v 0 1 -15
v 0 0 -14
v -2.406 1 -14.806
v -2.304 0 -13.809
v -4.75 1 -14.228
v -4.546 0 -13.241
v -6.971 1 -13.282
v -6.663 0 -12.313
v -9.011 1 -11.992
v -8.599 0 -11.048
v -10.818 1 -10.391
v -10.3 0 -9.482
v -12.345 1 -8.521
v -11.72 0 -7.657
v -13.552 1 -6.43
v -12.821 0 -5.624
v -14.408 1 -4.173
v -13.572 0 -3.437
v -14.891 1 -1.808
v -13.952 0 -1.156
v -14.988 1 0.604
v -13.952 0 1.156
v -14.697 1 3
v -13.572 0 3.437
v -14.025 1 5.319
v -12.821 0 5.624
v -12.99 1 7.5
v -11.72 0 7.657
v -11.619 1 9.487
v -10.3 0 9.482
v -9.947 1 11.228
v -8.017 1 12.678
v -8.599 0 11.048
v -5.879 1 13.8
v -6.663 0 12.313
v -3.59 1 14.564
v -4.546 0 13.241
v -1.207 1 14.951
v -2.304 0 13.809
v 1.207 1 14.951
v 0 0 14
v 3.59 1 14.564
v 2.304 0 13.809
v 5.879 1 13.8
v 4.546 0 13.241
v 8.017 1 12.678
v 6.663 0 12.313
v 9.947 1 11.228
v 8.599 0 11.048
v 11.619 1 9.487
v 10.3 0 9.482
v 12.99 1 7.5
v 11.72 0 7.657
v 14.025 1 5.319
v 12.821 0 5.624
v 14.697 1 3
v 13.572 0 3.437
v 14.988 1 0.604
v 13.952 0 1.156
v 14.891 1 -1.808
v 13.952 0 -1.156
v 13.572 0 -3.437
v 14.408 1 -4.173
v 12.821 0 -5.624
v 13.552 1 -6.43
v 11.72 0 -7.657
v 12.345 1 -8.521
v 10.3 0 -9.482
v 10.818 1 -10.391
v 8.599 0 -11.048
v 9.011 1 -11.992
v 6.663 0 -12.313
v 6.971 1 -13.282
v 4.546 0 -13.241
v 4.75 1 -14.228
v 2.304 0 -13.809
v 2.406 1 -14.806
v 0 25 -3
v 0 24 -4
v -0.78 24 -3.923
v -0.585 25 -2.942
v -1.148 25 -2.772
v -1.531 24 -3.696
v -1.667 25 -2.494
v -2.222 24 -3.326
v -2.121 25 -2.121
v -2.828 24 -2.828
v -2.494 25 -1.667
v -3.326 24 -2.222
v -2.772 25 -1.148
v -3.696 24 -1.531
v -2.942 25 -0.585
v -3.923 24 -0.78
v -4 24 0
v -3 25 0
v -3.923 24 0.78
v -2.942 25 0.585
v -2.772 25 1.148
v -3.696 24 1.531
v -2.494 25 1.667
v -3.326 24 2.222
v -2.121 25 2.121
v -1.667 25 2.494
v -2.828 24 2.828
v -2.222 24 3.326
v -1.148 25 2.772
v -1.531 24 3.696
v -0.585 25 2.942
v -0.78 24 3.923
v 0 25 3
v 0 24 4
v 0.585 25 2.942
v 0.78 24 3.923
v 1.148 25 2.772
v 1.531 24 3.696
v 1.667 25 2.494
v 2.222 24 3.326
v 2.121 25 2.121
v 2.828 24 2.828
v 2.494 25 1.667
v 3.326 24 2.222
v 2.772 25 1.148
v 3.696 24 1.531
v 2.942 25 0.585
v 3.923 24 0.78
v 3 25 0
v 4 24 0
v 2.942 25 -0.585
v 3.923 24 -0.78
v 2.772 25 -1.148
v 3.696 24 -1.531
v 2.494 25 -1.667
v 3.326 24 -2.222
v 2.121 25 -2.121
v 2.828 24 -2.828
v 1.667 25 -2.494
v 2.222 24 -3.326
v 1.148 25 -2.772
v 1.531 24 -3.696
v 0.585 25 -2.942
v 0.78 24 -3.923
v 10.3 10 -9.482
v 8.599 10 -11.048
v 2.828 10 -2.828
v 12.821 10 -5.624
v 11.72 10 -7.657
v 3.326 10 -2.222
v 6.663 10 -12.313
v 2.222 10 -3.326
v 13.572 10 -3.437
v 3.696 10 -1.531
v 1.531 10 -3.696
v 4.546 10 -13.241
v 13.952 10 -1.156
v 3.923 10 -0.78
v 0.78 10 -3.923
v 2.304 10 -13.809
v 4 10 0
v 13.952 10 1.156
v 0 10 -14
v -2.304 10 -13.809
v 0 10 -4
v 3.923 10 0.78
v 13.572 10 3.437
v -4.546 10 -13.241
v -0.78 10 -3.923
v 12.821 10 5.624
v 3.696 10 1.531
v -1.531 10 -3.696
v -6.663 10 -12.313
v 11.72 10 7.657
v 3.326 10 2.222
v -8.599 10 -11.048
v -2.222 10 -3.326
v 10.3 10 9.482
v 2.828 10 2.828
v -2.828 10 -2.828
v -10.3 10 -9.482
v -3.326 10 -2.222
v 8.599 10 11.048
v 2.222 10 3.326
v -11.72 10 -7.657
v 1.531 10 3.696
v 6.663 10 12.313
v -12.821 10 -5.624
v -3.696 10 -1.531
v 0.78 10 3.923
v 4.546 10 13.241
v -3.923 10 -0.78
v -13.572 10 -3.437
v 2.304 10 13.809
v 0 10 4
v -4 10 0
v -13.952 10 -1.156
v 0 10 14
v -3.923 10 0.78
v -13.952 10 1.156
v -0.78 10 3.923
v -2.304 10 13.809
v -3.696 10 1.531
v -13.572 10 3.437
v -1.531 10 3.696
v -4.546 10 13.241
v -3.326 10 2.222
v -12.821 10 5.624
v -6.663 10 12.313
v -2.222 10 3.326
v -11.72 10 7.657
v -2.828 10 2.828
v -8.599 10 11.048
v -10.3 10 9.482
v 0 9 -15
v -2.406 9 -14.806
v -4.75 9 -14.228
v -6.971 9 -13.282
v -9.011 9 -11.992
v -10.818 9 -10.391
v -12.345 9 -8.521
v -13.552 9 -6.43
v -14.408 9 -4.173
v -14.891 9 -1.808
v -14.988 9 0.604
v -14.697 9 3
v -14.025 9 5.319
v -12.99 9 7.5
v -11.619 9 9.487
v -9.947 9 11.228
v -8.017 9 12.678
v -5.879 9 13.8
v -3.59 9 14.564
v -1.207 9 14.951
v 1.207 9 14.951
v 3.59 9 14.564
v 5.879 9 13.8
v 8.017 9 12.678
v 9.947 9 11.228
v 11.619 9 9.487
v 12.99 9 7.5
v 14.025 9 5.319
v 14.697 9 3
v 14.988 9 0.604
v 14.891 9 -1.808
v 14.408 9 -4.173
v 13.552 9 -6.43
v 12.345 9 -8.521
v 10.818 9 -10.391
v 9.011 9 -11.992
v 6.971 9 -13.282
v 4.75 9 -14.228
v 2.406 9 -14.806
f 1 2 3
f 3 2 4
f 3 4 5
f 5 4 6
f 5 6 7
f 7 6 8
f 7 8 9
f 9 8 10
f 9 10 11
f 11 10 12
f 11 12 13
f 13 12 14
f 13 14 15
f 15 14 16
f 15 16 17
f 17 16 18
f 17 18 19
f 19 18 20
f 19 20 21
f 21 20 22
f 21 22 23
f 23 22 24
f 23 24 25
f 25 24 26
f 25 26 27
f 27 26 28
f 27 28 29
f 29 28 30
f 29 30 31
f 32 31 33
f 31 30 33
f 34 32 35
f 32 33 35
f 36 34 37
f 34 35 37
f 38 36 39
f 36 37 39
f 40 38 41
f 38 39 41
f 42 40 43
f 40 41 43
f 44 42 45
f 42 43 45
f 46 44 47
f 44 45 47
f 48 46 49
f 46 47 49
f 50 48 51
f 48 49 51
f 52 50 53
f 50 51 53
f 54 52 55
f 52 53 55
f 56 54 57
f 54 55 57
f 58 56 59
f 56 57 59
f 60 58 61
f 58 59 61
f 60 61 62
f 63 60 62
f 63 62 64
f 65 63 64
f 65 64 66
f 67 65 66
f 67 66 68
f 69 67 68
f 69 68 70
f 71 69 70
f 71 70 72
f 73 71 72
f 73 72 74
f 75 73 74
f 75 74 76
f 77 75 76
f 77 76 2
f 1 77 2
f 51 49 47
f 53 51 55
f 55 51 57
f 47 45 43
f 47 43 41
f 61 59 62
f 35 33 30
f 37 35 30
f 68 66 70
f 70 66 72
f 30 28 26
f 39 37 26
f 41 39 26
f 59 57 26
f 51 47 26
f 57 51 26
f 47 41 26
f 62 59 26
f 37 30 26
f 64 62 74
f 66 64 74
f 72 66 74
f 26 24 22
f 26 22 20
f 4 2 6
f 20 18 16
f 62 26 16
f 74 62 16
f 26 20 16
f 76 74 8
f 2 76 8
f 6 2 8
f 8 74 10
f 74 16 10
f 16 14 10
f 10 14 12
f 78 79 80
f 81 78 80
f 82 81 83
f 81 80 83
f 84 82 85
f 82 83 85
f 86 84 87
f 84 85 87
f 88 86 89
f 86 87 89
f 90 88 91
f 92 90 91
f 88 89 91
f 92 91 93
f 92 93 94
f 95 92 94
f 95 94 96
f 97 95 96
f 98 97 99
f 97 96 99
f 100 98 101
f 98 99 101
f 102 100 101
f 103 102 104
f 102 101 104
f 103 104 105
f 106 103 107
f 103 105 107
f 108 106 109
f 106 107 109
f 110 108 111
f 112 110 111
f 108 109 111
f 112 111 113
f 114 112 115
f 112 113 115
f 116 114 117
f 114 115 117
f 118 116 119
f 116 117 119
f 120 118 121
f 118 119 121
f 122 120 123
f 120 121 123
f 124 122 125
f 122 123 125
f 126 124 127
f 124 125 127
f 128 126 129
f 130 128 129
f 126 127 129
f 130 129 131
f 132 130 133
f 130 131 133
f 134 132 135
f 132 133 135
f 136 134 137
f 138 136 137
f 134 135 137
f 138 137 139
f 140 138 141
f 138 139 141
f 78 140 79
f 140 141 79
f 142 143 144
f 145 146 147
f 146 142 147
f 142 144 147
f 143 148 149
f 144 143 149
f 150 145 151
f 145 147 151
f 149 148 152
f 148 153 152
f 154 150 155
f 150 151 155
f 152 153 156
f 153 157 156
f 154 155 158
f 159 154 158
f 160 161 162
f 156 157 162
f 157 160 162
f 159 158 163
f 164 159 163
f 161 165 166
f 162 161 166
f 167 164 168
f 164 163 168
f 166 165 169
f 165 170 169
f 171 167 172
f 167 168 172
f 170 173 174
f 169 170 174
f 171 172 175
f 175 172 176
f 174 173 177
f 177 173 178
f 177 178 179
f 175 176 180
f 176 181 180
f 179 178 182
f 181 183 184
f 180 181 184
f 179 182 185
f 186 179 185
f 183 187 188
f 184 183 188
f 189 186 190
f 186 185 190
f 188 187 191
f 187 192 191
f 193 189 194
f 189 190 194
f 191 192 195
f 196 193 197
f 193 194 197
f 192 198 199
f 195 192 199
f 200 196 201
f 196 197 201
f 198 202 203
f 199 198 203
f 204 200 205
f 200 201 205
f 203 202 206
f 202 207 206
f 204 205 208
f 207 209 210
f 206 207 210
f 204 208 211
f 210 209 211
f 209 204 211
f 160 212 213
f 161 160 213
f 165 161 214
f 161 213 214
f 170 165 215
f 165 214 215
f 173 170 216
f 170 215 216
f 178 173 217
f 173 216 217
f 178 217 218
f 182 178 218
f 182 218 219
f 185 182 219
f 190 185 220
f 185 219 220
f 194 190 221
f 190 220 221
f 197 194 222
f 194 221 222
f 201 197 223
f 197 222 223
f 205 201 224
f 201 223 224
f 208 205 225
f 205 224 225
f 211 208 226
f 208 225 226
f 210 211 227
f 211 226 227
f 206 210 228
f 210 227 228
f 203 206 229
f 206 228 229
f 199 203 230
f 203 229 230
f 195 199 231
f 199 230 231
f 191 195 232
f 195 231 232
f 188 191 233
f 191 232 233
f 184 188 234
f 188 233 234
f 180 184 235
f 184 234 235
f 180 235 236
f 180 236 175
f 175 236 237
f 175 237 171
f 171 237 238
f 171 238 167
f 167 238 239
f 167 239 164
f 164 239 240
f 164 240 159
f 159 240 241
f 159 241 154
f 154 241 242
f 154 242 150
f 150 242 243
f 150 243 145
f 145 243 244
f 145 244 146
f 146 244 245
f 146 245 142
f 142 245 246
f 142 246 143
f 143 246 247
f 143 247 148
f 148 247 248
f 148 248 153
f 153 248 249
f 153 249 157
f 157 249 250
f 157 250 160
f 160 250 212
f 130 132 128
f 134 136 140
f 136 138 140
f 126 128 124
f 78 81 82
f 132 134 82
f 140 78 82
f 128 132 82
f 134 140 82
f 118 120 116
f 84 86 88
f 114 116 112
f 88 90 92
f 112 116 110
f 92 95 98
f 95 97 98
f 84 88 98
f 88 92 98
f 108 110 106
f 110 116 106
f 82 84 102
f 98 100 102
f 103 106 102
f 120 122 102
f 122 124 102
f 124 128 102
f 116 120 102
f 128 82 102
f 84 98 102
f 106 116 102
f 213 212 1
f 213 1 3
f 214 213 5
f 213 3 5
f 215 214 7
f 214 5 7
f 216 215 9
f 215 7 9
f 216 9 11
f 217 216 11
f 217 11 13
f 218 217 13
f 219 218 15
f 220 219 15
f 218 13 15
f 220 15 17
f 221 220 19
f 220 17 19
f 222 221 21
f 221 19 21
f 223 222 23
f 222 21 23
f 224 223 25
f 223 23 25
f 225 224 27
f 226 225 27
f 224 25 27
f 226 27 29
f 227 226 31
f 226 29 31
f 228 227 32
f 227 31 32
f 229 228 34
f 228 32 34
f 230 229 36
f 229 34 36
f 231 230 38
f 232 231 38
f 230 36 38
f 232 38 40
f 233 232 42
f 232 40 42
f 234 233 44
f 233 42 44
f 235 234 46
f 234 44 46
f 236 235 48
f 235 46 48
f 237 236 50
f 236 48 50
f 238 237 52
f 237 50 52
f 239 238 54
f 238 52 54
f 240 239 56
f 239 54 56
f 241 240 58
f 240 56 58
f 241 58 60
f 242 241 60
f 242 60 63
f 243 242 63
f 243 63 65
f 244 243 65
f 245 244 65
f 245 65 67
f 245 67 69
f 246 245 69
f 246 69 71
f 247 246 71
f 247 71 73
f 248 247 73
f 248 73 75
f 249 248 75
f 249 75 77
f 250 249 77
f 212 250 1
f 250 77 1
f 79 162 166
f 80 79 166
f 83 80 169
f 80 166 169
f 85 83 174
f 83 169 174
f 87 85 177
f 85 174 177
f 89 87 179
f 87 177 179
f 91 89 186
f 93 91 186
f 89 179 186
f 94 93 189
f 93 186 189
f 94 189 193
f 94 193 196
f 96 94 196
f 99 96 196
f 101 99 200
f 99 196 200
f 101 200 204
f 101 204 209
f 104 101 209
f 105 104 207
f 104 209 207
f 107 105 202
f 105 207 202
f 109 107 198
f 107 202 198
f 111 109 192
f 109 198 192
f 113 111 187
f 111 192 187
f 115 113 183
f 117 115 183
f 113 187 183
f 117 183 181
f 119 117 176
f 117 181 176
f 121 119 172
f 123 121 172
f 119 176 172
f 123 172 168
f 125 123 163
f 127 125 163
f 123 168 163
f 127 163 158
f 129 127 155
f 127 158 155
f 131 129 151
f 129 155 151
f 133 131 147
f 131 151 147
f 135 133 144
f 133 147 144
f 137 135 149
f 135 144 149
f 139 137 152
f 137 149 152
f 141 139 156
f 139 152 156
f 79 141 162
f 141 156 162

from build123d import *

# Parameters (mm, degrees)
CHAMFER_1_SIZE = 1


with BuildPart() as part:
    # Эскиз1 → Повернуть1 (revolve)
    with BuildSketch(Plane.XY, mode=Mode.PRIVATE) as revolve_1_sk:
        Polygon((0, 25), (4, 25), (4, 10), (15, 10), (15, 0), (0, 0), align=None)
    revolve(revolve_1_sk.sketch.rotate(Axis((0, 0, 0), (0, 1, 0)), 90), axis=Axis((0, 0, 0), (0, 1, 0)))

    # Фаска1
    chamfer_1_edges = [part.edges().sort_by_distance(p)[0] for p in [
        (0, 0, 15),
        (0, 10, 15),
        (0, 25, 4),
    ]]
    chamfer(chamfer_1_edges, length=CHAMFER_1_SIZE)


solid = part.part
